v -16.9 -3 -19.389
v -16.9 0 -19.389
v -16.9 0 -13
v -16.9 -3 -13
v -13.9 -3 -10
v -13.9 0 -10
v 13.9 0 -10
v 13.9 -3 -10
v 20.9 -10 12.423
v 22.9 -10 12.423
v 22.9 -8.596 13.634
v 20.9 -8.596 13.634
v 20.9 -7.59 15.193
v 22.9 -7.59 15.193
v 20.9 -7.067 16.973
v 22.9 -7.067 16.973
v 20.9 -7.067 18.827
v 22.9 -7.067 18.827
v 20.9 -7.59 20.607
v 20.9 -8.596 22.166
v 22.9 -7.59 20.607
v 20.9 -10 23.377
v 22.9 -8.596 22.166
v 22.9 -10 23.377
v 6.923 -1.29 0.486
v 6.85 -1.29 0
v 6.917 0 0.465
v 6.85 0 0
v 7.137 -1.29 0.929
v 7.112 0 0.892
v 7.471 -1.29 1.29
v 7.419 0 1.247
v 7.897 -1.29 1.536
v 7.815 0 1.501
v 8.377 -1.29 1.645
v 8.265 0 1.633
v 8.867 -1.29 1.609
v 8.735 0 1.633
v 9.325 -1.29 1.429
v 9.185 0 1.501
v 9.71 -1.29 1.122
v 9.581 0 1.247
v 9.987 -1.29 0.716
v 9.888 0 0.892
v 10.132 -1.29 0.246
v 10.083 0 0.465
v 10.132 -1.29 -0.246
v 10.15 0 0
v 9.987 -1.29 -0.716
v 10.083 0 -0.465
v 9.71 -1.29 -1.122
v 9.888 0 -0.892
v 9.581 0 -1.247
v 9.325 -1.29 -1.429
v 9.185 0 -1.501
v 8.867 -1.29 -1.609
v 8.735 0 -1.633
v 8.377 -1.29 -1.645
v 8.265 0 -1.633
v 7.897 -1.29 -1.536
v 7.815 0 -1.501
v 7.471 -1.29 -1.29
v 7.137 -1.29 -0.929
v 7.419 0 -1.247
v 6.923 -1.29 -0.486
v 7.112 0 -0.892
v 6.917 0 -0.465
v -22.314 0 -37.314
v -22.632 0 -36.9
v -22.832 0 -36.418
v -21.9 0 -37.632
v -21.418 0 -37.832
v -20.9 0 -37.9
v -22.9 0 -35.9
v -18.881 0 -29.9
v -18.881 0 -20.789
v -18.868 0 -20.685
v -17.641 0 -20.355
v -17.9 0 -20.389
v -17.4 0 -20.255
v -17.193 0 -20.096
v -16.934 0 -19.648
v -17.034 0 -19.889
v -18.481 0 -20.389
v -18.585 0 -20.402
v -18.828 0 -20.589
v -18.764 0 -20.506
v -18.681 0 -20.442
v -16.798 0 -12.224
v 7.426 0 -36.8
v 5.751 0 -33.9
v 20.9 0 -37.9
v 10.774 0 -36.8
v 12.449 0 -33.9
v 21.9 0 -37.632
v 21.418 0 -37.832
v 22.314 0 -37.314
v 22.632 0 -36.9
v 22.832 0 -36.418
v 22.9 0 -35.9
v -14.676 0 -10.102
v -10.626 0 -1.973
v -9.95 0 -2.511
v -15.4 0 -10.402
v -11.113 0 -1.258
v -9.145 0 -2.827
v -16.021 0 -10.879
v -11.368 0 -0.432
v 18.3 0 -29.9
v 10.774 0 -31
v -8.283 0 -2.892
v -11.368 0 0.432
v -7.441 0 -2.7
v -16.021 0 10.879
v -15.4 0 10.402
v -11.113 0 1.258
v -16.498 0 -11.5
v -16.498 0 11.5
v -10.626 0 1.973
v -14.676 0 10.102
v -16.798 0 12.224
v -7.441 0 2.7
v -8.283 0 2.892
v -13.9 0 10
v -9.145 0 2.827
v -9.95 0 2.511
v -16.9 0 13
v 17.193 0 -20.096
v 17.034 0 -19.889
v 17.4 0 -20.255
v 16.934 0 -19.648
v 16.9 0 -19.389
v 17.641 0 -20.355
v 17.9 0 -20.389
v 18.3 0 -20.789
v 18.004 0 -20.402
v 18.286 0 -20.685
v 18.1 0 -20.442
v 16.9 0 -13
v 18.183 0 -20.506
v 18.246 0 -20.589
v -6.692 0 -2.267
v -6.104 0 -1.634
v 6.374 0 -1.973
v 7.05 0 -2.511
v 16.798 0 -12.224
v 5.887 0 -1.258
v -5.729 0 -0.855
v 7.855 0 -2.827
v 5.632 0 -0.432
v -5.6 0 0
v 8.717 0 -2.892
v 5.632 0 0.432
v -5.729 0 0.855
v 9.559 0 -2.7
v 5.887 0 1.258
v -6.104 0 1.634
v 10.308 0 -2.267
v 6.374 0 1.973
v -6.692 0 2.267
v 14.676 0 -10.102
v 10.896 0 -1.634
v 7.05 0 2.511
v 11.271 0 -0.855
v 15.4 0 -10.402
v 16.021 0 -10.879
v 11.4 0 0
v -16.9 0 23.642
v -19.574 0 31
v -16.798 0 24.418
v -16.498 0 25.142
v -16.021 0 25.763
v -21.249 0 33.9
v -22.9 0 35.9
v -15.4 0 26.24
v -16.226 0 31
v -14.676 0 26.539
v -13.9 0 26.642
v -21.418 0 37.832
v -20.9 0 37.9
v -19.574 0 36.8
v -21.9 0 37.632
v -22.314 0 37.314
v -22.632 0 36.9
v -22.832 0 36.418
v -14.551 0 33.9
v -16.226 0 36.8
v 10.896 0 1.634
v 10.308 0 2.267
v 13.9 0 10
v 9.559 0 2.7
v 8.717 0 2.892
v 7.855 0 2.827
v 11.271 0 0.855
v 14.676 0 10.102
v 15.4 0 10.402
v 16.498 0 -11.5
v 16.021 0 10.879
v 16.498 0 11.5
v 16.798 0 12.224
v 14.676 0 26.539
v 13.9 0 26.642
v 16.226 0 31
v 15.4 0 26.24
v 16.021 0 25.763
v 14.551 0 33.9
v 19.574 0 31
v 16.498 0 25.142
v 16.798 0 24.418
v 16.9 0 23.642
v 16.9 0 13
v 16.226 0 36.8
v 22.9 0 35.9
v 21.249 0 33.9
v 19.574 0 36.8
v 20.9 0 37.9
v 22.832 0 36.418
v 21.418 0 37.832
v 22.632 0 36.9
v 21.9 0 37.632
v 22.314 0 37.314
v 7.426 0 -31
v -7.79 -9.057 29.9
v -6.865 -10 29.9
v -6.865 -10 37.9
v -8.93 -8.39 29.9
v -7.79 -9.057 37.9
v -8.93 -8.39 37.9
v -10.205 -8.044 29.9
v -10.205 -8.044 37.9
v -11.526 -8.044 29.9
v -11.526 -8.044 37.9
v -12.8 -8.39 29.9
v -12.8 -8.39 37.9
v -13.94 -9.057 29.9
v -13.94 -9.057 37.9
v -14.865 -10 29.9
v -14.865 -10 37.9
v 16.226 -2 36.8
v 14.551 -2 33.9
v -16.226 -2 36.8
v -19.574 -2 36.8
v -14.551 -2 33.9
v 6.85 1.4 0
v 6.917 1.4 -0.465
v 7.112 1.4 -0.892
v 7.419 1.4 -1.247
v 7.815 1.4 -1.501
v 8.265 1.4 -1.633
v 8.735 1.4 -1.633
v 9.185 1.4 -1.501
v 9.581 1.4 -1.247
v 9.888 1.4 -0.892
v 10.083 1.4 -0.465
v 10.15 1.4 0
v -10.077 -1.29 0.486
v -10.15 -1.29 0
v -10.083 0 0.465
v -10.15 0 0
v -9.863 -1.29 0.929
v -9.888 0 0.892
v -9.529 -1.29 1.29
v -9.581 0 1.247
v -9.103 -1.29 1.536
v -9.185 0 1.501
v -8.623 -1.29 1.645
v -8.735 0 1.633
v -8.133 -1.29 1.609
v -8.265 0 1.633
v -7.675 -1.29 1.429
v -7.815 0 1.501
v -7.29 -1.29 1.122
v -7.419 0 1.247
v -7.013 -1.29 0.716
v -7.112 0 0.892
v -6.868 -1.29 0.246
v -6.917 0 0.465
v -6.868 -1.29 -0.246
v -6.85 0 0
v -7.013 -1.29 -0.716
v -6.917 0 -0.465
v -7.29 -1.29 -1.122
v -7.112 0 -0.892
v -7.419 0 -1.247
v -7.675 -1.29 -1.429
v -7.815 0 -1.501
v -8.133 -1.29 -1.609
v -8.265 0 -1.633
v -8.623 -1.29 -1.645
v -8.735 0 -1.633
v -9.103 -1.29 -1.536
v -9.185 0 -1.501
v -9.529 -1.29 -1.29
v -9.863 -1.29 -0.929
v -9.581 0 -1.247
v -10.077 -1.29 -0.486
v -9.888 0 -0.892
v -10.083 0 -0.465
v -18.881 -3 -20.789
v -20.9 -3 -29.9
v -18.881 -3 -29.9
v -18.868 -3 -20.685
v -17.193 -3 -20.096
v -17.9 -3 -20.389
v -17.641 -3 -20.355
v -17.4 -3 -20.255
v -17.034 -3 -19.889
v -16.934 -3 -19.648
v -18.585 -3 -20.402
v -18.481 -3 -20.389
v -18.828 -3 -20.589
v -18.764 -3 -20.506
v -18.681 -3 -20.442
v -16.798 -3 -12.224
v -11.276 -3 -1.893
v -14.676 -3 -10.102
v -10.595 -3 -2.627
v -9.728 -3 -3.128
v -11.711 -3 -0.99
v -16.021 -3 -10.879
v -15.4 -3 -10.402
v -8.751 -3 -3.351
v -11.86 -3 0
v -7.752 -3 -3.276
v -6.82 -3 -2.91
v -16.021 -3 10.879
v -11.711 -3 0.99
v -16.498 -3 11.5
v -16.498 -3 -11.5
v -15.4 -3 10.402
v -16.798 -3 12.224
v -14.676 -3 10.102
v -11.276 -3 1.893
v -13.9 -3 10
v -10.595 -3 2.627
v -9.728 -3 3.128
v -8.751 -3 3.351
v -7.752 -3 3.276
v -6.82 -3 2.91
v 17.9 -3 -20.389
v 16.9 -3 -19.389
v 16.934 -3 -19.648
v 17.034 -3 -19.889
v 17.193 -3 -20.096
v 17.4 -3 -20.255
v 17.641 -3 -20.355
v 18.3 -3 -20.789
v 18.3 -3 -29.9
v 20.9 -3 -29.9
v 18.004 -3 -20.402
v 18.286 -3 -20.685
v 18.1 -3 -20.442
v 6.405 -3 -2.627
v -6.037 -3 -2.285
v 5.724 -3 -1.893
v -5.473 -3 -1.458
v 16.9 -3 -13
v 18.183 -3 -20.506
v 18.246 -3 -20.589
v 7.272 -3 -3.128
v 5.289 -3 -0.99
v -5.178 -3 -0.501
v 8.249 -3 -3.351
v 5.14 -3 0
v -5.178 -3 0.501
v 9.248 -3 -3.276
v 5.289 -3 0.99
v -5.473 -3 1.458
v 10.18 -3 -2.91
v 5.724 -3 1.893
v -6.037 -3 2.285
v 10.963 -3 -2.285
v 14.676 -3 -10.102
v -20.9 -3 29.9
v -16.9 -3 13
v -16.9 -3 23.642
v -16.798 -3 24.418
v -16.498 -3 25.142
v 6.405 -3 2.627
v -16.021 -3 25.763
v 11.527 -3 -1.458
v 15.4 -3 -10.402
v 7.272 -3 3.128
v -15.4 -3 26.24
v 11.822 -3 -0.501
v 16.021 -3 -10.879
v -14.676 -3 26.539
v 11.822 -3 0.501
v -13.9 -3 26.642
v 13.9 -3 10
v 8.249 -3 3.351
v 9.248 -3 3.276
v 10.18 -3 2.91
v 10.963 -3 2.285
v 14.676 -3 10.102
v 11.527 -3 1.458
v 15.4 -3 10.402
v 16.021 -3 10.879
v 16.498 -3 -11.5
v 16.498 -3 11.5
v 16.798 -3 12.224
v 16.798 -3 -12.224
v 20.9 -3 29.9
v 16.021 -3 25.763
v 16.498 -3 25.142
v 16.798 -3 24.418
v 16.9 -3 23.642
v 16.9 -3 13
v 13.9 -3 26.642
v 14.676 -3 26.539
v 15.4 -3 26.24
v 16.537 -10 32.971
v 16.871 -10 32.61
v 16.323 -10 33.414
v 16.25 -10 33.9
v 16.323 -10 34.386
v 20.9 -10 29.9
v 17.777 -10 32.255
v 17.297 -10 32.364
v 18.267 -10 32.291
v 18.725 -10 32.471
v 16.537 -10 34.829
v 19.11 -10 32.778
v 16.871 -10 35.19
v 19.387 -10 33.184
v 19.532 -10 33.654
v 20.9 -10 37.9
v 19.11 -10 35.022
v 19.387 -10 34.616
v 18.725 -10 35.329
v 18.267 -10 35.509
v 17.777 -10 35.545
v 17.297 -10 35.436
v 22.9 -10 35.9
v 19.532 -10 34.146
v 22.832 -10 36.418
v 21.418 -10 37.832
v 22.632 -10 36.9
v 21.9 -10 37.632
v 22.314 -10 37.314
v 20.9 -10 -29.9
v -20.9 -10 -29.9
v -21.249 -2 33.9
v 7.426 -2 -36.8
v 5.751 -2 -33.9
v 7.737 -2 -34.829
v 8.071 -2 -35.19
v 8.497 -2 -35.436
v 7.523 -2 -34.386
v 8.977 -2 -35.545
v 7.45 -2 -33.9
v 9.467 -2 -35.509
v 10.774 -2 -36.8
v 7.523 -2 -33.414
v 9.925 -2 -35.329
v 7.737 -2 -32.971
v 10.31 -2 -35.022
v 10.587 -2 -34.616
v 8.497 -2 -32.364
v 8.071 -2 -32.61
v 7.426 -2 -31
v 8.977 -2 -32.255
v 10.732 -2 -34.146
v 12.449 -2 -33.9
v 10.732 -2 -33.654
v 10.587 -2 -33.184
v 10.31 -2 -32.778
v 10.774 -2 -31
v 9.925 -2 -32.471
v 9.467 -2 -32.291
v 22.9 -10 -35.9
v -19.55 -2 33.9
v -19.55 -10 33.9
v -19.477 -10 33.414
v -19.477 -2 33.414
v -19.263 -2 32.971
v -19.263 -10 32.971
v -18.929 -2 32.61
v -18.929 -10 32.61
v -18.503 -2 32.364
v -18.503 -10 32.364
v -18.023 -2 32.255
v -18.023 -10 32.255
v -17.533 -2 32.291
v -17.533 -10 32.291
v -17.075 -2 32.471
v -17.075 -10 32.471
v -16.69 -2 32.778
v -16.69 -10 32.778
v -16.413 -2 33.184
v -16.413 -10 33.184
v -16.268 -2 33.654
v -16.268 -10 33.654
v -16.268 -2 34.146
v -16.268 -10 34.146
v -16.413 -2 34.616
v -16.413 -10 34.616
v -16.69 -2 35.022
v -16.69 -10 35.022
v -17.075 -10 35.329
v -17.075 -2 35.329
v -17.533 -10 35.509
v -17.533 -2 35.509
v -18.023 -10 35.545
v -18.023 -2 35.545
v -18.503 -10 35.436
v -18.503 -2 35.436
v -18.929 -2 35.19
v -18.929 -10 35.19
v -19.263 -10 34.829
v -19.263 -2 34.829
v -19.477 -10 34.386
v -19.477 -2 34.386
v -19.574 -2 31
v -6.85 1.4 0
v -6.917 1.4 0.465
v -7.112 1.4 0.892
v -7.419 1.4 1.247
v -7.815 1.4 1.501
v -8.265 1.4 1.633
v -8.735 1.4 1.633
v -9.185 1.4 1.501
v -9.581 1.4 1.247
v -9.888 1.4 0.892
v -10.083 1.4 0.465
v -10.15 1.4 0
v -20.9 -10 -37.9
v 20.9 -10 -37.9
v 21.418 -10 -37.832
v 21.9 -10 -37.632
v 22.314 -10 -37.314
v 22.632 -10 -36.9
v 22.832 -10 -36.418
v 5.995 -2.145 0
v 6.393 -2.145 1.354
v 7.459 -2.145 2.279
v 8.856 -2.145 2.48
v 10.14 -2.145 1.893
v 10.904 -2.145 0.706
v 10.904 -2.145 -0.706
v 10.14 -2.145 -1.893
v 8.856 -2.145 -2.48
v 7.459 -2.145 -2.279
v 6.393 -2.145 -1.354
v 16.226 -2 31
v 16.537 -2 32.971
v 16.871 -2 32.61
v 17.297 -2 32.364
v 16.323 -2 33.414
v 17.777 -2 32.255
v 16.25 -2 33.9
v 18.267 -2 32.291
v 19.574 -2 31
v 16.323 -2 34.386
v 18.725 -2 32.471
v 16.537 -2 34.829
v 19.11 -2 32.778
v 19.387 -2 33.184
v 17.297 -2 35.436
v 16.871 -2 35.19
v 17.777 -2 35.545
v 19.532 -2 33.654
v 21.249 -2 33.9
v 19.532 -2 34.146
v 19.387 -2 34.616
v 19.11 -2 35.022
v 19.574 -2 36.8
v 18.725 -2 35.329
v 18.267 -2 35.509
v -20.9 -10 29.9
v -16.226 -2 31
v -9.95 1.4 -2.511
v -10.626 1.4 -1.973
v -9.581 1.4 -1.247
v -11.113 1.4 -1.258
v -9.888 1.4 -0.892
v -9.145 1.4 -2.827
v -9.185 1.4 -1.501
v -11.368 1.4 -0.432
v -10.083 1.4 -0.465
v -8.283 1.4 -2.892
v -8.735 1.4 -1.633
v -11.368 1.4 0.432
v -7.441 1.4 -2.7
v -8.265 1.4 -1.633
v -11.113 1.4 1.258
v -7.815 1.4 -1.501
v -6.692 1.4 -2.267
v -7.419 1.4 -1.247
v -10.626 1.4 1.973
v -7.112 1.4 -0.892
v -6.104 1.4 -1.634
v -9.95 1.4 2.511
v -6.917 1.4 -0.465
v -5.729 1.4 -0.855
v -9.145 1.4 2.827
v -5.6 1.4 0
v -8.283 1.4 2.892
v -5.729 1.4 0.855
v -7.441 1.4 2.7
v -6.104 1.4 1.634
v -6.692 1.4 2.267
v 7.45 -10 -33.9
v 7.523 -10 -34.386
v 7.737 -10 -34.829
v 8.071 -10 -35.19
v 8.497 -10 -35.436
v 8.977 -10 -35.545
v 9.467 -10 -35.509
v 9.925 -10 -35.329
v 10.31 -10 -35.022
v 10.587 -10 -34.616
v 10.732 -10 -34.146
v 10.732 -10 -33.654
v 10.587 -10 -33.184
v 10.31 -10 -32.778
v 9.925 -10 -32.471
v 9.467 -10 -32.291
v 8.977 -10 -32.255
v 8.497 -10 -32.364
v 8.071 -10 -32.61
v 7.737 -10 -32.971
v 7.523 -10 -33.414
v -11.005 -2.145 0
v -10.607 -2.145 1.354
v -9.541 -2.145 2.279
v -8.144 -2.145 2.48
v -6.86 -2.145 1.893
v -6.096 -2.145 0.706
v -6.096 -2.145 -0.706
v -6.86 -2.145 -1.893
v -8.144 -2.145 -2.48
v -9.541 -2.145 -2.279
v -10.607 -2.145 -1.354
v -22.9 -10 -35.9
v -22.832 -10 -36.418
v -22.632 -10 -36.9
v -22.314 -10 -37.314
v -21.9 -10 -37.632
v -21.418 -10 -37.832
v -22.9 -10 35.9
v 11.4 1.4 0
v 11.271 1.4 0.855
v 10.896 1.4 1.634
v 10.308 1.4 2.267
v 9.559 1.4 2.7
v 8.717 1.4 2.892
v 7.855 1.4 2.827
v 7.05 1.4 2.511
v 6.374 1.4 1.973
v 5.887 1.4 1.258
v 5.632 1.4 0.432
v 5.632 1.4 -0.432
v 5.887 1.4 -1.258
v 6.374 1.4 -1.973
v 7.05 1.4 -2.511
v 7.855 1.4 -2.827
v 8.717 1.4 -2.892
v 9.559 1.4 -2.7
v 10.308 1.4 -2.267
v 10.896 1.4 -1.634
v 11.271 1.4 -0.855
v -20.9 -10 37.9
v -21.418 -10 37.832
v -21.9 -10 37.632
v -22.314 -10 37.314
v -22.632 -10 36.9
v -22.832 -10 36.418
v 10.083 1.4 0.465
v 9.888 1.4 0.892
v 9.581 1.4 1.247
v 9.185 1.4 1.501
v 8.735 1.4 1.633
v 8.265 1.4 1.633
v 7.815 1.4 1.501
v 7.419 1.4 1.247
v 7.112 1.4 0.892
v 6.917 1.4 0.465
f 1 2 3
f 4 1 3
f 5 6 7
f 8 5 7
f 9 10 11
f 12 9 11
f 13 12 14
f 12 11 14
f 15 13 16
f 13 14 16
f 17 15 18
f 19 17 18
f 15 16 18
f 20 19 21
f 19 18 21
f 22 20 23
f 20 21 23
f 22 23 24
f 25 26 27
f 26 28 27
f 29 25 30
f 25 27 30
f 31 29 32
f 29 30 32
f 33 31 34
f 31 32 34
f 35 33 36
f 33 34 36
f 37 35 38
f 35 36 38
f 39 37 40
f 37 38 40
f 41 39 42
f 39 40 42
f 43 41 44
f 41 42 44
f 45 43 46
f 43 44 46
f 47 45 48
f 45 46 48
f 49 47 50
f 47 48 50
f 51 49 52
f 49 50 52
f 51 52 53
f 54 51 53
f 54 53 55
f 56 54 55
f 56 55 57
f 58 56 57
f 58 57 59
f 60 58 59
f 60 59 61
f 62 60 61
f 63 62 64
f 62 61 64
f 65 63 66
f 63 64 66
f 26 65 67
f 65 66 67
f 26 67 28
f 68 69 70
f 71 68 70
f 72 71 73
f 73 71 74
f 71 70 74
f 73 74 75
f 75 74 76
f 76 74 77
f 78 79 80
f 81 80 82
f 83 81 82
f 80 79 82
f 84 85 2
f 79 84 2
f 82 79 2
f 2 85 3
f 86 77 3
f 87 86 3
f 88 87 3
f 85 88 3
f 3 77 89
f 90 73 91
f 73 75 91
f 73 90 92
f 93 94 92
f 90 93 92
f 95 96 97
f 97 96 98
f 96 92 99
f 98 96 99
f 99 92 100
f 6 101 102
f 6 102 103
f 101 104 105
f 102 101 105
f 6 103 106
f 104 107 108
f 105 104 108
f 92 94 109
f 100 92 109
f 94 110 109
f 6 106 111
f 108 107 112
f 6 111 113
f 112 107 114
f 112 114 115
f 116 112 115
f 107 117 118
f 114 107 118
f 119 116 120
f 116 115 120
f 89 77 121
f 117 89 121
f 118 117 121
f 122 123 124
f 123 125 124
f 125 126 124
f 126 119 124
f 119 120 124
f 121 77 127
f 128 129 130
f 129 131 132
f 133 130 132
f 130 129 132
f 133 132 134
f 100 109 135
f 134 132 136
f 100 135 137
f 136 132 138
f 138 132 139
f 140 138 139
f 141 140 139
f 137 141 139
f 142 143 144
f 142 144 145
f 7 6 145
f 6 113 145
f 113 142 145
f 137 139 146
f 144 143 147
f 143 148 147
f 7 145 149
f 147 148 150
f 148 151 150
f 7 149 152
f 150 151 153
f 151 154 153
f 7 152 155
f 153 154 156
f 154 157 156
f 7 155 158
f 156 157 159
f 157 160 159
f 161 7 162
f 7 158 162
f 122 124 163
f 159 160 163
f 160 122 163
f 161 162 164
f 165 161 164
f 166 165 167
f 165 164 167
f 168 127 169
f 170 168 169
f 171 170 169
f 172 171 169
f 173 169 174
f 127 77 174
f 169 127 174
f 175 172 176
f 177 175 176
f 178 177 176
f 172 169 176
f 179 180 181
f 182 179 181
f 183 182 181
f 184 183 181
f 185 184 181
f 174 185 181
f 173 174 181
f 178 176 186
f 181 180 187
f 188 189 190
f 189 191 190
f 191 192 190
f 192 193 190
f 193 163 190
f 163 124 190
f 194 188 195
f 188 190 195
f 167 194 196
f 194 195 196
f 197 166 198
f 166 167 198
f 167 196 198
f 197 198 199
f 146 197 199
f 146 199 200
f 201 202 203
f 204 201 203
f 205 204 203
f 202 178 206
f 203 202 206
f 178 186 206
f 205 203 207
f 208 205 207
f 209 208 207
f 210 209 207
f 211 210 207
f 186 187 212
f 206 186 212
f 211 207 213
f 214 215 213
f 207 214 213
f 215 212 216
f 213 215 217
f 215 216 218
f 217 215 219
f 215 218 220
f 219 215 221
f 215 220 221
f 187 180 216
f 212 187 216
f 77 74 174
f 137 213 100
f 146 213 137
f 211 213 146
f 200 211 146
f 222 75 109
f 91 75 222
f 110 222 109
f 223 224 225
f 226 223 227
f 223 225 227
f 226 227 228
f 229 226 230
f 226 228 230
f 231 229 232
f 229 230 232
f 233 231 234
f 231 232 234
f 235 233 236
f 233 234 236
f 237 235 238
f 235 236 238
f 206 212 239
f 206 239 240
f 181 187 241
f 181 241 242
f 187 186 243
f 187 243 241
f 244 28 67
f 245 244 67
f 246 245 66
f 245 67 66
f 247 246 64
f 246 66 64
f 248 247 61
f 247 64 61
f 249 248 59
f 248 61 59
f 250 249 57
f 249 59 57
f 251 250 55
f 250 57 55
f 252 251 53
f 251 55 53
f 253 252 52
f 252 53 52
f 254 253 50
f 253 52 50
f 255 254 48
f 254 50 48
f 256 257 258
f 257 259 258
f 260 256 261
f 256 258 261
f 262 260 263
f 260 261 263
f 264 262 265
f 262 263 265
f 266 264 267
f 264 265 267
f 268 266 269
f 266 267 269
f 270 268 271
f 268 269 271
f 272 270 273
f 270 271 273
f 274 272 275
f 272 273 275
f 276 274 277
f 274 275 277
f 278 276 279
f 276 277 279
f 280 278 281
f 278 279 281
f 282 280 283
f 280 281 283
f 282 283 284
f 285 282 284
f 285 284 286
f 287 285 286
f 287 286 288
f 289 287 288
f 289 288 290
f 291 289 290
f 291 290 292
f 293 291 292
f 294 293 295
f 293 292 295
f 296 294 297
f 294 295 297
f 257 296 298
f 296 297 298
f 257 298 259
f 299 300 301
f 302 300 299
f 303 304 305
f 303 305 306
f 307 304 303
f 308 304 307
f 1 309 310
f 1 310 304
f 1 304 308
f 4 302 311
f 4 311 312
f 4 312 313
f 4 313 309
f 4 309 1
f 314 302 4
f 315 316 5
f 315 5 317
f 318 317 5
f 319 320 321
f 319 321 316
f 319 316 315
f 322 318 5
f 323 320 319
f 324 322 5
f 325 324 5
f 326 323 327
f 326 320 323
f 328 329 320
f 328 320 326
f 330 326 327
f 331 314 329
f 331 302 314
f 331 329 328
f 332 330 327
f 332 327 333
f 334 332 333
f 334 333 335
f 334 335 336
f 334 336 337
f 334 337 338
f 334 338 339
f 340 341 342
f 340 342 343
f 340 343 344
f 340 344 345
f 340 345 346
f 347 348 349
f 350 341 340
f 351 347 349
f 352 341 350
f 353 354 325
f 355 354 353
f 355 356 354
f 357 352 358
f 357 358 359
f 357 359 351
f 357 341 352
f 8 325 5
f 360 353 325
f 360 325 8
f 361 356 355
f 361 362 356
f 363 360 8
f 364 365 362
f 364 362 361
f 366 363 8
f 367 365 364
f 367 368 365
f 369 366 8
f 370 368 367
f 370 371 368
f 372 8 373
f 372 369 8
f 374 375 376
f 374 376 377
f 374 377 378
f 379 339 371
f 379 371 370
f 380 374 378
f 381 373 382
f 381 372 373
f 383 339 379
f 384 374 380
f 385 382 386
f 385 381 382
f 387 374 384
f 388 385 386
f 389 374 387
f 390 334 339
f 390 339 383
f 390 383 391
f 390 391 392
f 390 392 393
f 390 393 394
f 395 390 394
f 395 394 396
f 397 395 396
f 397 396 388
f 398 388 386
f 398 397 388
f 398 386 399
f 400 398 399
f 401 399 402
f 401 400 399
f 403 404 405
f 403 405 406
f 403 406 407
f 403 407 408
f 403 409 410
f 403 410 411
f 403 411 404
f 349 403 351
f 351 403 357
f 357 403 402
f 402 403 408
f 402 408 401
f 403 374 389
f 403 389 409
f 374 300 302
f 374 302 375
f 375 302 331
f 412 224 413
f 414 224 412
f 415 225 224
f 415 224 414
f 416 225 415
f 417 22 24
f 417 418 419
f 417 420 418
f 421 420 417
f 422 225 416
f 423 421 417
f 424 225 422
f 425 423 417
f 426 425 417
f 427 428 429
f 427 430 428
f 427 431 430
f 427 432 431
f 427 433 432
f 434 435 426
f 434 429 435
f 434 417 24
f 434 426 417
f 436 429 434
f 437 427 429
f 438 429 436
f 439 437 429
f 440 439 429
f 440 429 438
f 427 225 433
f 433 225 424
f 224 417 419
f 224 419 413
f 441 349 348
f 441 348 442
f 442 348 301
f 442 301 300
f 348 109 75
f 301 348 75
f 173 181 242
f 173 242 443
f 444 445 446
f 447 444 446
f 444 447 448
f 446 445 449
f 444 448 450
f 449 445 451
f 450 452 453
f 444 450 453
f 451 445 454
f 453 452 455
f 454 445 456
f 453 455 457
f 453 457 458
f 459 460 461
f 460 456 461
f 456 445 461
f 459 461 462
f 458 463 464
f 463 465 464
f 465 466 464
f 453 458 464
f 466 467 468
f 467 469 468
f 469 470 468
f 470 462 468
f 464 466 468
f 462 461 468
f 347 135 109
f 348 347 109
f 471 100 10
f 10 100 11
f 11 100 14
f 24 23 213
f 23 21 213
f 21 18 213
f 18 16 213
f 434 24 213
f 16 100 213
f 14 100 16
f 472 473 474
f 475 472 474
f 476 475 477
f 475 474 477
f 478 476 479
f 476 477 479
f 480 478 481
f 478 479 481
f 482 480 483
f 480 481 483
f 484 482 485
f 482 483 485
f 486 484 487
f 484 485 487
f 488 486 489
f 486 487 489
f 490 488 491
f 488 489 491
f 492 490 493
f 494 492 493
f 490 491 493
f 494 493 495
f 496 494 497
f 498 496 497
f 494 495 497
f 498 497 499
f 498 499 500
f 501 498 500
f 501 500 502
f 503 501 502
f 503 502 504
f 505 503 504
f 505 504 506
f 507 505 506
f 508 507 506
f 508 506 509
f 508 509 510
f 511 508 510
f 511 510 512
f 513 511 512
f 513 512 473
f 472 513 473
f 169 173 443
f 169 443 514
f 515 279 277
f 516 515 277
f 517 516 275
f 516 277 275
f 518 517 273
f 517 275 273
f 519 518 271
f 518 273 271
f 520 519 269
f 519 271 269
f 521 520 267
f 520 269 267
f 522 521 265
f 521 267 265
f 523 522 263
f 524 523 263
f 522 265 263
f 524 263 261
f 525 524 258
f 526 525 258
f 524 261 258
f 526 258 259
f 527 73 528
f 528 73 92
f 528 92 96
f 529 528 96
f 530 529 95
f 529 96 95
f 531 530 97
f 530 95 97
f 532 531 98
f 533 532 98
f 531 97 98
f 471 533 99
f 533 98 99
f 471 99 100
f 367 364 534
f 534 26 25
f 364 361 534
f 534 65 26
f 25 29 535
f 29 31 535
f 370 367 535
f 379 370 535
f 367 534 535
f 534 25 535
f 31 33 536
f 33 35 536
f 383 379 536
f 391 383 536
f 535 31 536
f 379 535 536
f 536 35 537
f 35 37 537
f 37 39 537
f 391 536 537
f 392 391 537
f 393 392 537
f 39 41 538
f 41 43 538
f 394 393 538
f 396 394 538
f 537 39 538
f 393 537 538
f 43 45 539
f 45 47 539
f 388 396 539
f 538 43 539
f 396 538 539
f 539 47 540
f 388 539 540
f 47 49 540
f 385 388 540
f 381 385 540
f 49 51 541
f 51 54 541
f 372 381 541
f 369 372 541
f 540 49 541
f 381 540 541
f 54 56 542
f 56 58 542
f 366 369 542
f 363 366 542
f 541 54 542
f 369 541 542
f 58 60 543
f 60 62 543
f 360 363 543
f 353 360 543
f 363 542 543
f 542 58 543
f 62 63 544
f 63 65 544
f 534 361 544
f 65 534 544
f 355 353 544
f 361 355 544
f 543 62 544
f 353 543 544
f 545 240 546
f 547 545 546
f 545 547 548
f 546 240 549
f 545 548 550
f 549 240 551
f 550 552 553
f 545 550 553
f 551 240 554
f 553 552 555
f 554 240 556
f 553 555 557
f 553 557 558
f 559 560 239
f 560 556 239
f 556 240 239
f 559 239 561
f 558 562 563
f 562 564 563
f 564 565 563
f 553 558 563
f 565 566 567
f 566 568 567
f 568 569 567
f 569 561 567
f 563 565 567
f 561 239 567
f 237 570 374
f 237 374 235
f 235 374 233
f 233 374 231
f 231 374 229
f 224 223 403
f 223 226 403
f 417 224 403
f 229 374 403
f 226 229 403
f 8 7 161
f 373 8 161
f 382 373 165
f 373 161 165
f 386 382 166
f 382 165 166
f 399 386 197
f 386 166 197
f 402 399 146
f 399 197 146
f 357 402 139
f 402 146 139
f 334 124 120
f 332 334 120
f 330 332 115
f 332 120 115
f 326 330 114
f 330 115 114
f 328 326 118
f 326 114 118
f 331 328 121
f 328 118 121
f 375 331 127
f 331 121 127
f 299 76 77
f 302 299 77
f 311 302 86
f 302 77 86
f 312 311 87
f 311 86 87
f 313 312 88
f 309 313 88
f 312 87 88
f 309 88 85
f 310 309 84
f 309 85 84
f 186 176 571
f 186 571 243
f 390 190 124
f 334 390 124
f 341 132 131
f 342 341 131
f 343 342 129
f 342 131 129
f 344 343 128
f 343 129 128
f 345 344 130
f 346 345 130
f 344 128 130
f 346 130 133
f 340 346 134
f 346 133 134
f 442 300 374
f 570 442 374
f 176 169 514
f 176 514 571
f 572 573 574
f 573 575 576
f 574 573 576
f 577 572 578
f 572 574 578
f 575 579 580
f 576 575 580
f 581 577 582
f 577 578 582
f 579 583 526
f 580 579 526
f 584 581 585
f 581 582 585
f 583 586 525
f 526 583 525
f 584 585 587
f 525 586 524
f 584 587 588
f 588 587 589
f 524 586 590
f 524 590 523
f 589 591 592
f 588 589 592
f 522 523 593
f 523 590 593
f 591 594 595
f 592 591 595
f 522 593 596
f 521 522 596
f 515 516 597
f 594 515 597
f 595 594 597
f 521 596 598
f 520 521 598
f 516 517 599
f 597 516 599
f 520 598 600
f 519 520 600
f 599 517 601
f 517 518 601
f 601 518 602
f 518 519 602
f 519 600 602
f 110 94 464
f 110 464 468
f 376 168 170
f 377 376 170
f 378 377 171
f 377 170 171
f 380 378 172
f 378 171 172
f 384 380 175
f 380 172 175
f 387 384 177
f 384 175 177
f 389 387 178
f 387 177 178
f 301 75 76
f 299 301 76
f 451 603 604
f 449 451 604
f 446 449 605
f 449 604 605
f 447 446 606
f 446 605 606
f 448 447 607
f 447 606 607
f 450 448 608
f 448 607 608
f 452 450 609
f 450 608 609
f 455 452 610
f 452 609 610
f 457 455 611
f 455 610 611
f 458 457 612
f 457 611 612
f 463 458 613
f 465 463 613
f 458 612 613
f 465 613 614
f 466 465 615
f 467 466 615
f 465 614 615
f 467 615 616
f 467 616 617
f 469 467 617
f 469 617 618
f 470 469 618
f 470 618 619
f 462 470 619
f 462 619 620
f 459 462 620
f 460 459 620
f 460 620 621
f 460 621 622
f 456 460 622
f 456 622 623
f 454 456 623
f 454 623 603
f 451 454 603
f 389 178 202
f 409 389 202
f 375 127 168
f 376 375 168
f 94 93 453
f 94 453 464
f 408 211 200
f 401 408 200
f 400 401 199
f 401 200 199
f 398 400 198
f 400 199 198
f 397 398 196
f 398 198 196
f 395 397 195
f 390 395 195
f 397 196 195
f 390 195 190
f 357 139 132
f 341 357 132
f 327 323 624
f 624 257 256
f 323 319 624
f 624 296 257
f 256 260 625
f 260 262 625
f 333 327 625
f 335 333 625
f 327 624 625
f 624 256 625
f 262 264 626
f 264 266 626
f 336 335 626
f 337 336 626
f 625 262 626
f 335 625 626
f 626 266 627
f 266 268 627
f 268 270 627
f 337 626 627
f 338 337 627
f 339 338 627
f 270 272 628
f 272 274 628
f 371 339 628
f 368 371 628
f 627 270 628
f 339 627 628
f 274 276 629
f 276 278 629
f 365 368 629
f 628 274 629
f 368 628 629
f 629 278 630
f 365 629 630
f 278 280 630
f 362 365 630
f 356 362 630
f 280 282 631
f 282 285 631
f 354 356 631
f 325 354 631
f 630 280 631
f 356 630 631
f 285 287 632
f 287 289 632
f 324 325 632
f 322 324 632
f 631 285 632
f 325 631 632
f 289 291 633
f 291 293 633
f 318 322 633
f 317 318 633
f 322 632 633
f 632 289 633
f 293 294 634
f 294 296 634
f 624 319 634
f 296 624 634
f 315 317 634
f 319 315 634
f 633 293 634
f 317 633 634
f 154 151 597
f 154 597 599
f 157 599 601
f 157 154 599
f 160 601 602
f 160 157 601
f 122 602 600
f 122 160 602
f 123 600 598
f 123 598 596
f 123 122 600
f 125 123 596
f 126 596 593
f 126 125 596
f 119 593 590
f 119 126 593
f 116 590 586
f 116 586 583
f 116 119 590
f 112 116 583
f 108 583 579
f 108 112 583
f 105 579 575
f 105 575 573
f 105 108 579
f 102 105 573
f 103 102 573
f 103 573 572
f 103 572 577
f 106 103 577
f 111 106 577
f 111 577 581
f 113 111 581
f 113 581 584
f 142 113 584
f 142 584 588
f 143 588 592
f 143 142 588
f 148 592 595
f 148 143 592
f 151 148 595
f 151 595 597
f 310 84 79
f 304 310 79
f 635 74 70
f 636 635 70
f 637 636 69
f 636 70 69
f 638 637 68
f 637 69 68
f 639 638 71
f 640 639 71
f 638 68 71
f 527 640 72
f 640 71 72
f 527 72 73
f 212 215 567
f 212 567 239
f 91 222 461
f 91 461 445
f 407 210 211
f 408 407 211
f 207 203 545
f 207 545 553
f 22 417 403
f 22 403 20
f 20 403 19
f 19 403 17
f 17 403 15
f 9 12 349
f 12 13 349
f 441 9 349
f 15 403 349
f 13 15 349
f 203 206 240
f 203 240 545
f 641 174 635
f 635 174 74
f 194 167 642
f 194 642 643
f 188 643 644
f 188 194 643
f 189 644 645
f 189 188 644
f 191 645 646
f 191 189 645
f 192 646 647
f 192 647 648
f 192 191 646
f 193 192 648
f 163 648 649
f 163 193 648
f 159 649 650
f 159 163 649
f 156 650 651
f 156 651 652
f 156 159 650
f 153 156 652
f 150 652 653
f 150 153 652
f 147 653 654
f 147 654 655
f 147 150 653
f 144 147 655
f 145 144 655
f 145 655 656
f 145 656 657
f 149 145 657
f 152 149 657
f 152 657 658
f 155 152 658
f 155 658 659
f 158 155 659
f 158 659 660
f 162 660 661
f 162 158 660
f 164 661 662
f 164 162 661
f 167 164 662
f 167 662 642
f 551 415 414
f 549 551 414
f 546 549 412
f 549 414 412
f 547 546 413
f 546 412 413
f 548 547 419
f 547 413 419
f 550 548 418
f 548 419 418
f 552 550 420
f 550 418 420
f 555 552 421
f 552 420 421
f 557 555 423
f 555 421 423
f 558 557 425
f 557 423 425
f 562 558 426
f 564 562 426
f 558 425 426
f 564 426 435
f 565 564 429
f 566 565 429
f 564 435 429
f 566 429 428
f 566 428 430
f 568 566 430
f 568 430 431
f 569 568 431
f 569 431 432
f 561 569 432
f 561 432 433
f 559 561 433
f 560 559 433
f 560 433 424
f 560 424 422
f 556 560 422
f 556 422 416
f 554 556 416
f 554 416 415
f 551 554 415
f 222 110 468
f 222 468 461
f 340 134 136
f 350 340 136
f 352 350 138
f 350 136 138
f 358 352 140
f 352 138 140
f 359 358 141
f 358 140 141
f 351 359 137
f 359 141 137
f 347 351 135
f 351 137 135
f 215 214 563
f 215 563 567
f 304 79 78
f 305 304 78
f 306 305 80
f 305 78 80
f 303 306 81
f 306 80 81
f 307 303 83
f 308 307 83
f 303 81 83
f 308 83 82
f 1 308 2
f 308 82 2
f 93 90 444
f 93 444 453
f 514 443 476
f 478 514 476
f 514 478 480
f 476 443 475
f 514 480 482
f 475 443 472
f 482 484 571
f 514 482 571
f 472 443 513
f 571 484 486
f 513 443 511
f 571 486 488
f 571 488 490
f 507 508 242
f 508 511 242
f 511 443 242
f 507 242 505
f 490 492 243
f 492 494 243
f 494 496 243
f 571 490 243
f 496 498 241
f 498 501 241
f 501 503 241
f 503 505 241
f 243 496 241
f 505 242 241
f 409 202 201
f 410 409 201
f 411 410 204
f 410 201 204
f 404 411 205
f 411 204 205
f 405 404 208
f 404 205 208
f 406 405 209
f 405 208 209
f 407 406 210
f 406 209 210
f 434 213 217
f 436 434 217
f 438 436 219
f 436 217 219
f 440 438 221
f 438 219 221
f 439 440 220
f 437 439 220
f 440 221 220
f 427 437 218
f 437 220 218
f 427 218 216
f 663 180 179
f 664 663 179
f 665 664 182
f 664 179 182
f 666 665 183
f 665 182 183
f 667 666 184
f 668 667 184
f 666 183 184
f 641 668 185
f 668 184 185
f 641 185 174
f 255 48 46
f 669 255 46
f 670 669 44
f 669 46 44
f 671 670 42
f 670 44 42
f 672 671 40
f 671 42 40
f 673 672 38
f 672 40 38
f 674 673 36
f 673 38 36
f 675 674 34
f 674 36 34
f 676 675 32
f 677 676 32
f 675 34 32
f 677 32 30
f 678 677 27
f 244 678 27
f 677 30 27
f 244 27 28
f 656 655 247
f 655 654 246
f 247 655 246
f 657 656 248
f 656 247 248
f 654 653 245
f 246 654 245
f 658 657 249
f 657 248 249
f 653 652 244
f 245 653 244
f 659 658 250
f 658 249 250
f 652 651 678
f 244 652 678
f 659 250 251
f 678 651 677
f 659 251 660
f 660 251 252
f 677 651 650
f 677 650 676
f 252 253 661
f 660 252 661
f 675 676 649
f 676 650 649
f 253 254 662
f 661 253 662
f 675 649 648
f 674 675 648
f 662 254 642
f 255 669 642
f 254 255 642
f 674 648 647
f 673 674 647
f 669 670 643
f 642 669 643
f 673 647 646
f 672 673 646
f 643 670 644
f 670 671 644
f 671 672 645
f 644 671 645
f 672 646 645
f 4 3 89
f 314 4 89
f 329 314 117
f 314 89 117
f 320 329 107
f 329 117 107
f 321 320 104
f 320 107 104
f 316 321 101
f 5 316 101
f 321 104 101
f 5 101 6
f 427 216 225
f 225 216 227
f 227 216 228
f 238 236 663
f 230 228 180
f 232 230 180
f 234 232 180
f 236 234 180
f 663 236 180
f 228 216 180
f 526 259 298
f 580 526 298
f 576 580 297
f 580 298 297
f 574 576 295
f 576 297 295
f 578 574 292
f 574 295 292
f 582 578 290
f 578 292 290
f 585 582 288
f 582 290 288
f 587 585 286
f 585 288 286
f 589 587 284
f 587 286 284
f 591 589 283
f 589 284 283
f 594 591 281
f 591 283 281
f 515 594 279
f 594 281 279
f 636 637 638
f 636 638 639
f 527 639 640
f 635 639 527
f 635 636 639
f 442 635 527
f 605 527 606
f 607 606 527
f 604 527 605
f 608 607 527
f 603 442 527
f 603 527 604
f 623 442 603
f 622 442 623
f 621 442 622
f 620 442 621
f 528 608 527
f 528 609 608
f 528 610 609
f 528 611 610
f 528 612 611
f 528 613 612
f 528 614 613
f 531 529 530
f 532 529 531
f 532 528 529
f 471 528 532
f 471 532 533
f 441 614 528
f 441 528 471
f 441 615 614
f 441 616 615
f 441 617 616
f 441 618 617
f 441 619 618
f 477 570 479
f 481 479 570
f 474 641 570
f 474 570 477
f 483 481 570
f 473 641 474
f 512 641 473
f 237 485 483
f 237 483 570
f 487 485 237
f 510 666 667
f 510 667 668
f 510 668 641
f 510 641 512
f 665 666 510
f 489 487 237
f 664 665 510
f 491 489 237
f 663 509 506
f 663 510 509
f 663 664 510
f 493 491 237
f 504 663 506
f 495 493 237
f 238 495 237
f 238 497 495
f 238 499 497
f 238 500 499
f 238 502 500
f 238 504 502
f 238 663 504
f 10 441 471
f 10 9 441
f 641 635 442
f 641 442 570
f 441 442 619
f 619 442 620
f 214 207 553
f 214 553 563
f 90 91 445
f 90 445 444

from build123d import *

# Parameters (mm, degrees)
F1_DEPTH        = 10
F0_R            = 2.9
F2_DEPTH        = 3
F3_R            = 6.5
F4_DEPTH        = 4
F5_R            = 5
F6_DEPTH        = 12
F7_DEPTH        = 2
F8_D            = 3.3
F8_DEPTH        = 13.8
F8_START        = 2
F8_TIP          = 0.9914200214
F9_DEPTH        = 1.4
F10_D           = 3.3
F10_DEPTH       = 8
F10_TIP         = 0.9914200214
F12_D           = 3.3
F12_DEPTH       = 8
F12_CSINK_D     = 6.72
F12_CSINK_ANGLE = 90
F12_TIP         = 0.9914200214


with BuildPart() as f1:
    # F0 (on Front) → F1 (new body)
    with BuildSketch(Plane.XZ):
        with BuildLine():
            Line((20.9, 37.9), (17.9, 37.9))
            Line((17.9, 37.9), (-17.9, 37.9))
            Line((-17.9, 37.9), (-20.9, 37.9))
            ThreePointArc((-20.9, 37.9), (-22.3142135624, 37.3142135624), (-22.9, 35.9))
            Line((-22.9, 35.9), (-22.9, 32.9))
            Line((-22.9, 32.9), (-22.9, -35.9))
            ThreePointArc((-22.9, -35.9), (-22.3142135624, -37.3142135624), (-20.9, -37.9))
            Line((-20.9, -37.9), (20.9, -37.9))
            ThreePointArc((20.9, -37.9), (22.3142135624, -37.3142135624), (22.9, -35.9))
            Line((22.9, -35.9), (22.9, 32.9))
            Line((22.9, 32.9), (22.9, 35.9))
            ThreePointArc((22.9, 35.9), (22.3142135624, 37.3142135624), (20.9, 37.9))
        make_face()
        Polygon((7.4256842194, -31), (10.7743157806, -31), (12.4486315613, -33.9), (10.7743157806, -36.8), (7.4256842194, -36.8), (5.7513684387, -33.9), align=None, mode=Mode.SUBTRACT)
        Polygon((-16.2256842194, 36.8), (-14.5513684387, 33.9), (-16.2256842194, 31), (-19.5743157806, 31), (-21.2486315613, 33.9), (-19.5743157806, 36.8), align=None, mode=Mode.SUBTRACT)
        Polygon((20.9, 29.9), (20.9, -29.9), (18.3, -29.9), (-18.8811943151, -29.9), (-20.9, -29.9), (-20.9, 29.9), align=None, mode=Mode.SUBTRACT)
        Polygon((21.2486315613, 33.9), (19.5743157806, 31), (16.2256842194, 31), (14.5513684387, 33.9), (16.2256842194, 36.8), (19.5743157806, 36.8), align=None, mode=Mode.SUBTRACT)
        Polygon((-16.2256842194, 31), (-14.5513684387, 33.9), (-16.2256842194, 36.8), (-19.5743157806, 36.8), (-21.2486315613, 33.9), (-19.5743157806, 31), align=None)
        Polygon((16.2256842194, 31), (19.5743157806, 31), (21.2486315613, 33.9), (19.5743157806, 36.8), (16.2256842194, 36.8), (14.5513684387, 33.9), align=None)
        Polygon((12.4486315613, -33.9), (10.7743157806, -31), (7.4256842194, -31), (5.7513684387, -33.9), (7.4256842194, -36.8), (10.7743157806, -36.8), align=None)
    extrude(amount=F1_DEPTH)

    # F0 (on Front) → F2 (join)
    with BuildSketch(Plane.XZ):
        with BuildLine():
            Line((18.3, -29.9), (20.9, -29.9))
            Line((20.9, -29.9), (20.9, 29.9))
            Line((20.9, 29.9), (-20.9, 29.9))
            Line((-20.9, 29.9), (-20.9, -29.9))
            Line((-20.9, -29.9), (-18.8811943151, -29.9))
            Line((-18.8811943151, -29.9), (-18.8811943151, -20.7887917079))
            ThreePointArc((-18.8811943151, -20.7887917079), (-18.7640370276, -20.5059489954), (-18.4811943151, -20.3887917079))
            Line((-18.4811943151, -20.3887917079), (-17.9, -20.3887917079))
            ThreePointArc((-17.9, -20.3887917079), (-17.1928932188, -20.0958984891), (-16.9, -19.3887917079))
            Line((-16.9, -19.3887917079), (-16.9, -13))
            ThreePointArc((-16.9, -13), (-16.0213203436, -10.8786796564), (-13.9, -10))
            Line((-13.9, -10), (13.9, -10))
            ThreePointArc((13.9, -10), (16.0213203436, -10.8786796564), (16.9, -13))
            Line((16.9, -13), (16.9, -19.3887917079))
            ThreePointArc((16.9, -19.3887917079), (17.1928932188, -20.0958984891), (17.9, -20.3887917079))
            ThreePointArc((17.9, -20.3887917079), (18.1828427125, -20.5059489954), (18.3, -20.7887917079))
            Line((18.3, -20.7887917079), (18.3, -29.9))
        make_face()
        with Locations((-8.5, 0)):
            Circle(F0_R, mode=Mode.SUBTRACT)
        with Locations((8.5, 0)):
            Circle(F0_R, mode=Mode.SUBTRACT)
        with BuildLine():
            ThreePointArc((-16.9, 23.6416198403), (-16.0213203436, 25.7629401838), (-13.9, 26.6416198403))
            Line((-13.9, 26.6416198403), (13.9, 26.6416198403))
            ThreePointArc((13.9, 26.6416198403), (16.0213203436, 25.7629401838), (16.9, 23.6416198403))
            Line((16.9, 23.6416198403), (16.9, 13))
            ThreePointArc((16.9, 13), (16.0213203436, 10.8786796564), (13.9, 10))
            Line((13.9, 10), (-13.9, 10))
            ThreePointArc((-13.9, 10), (-16.0213203436, 10.8786796564), (-16.9, 13))
            Line((-16.9, 13), (-16.9, 23.6416198403))
        make_face(mode=Mode.SUBTRACT)
        with Locations((-8.5, 0)):
            Circle(F0_R)
        with Locations((8.5, 0)):
            Circle(F0_R)
    extrude(amount=F2_DEPTH)

    # F3 (on face) → F4 (cut)
    with BuildSketch(Plane.YZ.offset(22.9)):
        with Locations((-13.5, 17.9)):
            Circle(F3_R)
    extrude(amount=-F4_DEPTH, mode=Mode.SUBTRACT)

    # F5 (on face) → F6 (cut)
    with BuildSketch(Plane.XY.offset(37.9)):
        with Locations((-10.8651584014, -13)):
            Circle(F5_R)
    extrude(amount=-F6_DEPTH, mode=Mode.SUBTRACT)

    # F0 (on Front) → F7 (cut)
    with BuildSketch(Plane.XZ):
        Polygon((-16.2256842194, 31), (-14.5513684387, 33.9), (-16.2256842194, 36.8), (-19.5743157806, 36.8), (-21.2486315613, 33.9), (-19.5743157806, 31), align=None)
        Polygon((16.2256842194, 31), (19.5743157806, 31), (21.2486315613, 33.9), (19.5743157806, 36.8), (16.2256842194, 36.8), (14.5513684387, 33.9), align=None)
        Polygon((12.4486315613, -33.9), (10.7743157806, -31), (7.4256842194, -31), (5.7513684387, -33.9), (7.4256842194, -36.8), (10.7743157806, -36.8), align=None)
    extrude(amount=F7_DEPTH, mode=Mode.SUBTRACT)

    # F8
    # its depths count from where the whole tool has entered the part; down to there all is cleared
    with Locations(Plane(origin=(0, 0, 0), x_dir=(1, 0, 0), z_dir=(0, 1, 0)).offset(-F8_START)):
        with Locations((-17.9, -33.9), (17.9, -33.9), (9.1, 33.9)):
            Hole(F8_D / 2, depth=F8_DEPTH)
            with Locations((0, 0, -(F8_DEPTH + F8_TIP / 2))):  # 118° drill point
                Cone(0, F8_D / 2, F8_TIP, mode=Mode.SUBTRACT)

    # F0 (on Front) → F9 (join)
    with BuildSketch(Plane.XZ):
        with Locations((8.5, 0)):
            Circle(F0_R)
        with Locations((-8.5, 0)):
            Circle(F0_R)
    extrude(amount=-F9_DEPTH)

    # F10 (one way)
    with BuildSketch(Plane.XZ):
        with Locations((-8.5, 0), (8.5, 0)):
            Circle(F10_D / 2)
    extrude(amount=-F10_DEPTH, mode=Mode.SUBTRACT)
    with Locations(Plane.XZ):
        with Locations((-8.5, 0), (8.5, 0)):
            with Locations((0, 0, -(F10_DEPTH + F10_TIP / 2))):  # 118° drill point
                Cone(0, F10_D / 2, F10_TIP, mode=Mode.SUBTRACT)

    # F12
    with Locations(Plane.XZ.offset(3)):
        with Locations((-8.5, 0), (8.5, 0)):
            CounterSinkHole(F12_D / 2, F12_CSINK_D / 2, depth=F12_DEPTH, counter_sink_angle=F12_CSINK_ANGLE)
            with Locations((0, 0, -(F12_DEPTH + F12_TIP / 2))):  # 118° drill point
                Cone(0, F12_D / 2, F12_TIP, mode=Mode.SUBTRACT)


solid = f1.part
